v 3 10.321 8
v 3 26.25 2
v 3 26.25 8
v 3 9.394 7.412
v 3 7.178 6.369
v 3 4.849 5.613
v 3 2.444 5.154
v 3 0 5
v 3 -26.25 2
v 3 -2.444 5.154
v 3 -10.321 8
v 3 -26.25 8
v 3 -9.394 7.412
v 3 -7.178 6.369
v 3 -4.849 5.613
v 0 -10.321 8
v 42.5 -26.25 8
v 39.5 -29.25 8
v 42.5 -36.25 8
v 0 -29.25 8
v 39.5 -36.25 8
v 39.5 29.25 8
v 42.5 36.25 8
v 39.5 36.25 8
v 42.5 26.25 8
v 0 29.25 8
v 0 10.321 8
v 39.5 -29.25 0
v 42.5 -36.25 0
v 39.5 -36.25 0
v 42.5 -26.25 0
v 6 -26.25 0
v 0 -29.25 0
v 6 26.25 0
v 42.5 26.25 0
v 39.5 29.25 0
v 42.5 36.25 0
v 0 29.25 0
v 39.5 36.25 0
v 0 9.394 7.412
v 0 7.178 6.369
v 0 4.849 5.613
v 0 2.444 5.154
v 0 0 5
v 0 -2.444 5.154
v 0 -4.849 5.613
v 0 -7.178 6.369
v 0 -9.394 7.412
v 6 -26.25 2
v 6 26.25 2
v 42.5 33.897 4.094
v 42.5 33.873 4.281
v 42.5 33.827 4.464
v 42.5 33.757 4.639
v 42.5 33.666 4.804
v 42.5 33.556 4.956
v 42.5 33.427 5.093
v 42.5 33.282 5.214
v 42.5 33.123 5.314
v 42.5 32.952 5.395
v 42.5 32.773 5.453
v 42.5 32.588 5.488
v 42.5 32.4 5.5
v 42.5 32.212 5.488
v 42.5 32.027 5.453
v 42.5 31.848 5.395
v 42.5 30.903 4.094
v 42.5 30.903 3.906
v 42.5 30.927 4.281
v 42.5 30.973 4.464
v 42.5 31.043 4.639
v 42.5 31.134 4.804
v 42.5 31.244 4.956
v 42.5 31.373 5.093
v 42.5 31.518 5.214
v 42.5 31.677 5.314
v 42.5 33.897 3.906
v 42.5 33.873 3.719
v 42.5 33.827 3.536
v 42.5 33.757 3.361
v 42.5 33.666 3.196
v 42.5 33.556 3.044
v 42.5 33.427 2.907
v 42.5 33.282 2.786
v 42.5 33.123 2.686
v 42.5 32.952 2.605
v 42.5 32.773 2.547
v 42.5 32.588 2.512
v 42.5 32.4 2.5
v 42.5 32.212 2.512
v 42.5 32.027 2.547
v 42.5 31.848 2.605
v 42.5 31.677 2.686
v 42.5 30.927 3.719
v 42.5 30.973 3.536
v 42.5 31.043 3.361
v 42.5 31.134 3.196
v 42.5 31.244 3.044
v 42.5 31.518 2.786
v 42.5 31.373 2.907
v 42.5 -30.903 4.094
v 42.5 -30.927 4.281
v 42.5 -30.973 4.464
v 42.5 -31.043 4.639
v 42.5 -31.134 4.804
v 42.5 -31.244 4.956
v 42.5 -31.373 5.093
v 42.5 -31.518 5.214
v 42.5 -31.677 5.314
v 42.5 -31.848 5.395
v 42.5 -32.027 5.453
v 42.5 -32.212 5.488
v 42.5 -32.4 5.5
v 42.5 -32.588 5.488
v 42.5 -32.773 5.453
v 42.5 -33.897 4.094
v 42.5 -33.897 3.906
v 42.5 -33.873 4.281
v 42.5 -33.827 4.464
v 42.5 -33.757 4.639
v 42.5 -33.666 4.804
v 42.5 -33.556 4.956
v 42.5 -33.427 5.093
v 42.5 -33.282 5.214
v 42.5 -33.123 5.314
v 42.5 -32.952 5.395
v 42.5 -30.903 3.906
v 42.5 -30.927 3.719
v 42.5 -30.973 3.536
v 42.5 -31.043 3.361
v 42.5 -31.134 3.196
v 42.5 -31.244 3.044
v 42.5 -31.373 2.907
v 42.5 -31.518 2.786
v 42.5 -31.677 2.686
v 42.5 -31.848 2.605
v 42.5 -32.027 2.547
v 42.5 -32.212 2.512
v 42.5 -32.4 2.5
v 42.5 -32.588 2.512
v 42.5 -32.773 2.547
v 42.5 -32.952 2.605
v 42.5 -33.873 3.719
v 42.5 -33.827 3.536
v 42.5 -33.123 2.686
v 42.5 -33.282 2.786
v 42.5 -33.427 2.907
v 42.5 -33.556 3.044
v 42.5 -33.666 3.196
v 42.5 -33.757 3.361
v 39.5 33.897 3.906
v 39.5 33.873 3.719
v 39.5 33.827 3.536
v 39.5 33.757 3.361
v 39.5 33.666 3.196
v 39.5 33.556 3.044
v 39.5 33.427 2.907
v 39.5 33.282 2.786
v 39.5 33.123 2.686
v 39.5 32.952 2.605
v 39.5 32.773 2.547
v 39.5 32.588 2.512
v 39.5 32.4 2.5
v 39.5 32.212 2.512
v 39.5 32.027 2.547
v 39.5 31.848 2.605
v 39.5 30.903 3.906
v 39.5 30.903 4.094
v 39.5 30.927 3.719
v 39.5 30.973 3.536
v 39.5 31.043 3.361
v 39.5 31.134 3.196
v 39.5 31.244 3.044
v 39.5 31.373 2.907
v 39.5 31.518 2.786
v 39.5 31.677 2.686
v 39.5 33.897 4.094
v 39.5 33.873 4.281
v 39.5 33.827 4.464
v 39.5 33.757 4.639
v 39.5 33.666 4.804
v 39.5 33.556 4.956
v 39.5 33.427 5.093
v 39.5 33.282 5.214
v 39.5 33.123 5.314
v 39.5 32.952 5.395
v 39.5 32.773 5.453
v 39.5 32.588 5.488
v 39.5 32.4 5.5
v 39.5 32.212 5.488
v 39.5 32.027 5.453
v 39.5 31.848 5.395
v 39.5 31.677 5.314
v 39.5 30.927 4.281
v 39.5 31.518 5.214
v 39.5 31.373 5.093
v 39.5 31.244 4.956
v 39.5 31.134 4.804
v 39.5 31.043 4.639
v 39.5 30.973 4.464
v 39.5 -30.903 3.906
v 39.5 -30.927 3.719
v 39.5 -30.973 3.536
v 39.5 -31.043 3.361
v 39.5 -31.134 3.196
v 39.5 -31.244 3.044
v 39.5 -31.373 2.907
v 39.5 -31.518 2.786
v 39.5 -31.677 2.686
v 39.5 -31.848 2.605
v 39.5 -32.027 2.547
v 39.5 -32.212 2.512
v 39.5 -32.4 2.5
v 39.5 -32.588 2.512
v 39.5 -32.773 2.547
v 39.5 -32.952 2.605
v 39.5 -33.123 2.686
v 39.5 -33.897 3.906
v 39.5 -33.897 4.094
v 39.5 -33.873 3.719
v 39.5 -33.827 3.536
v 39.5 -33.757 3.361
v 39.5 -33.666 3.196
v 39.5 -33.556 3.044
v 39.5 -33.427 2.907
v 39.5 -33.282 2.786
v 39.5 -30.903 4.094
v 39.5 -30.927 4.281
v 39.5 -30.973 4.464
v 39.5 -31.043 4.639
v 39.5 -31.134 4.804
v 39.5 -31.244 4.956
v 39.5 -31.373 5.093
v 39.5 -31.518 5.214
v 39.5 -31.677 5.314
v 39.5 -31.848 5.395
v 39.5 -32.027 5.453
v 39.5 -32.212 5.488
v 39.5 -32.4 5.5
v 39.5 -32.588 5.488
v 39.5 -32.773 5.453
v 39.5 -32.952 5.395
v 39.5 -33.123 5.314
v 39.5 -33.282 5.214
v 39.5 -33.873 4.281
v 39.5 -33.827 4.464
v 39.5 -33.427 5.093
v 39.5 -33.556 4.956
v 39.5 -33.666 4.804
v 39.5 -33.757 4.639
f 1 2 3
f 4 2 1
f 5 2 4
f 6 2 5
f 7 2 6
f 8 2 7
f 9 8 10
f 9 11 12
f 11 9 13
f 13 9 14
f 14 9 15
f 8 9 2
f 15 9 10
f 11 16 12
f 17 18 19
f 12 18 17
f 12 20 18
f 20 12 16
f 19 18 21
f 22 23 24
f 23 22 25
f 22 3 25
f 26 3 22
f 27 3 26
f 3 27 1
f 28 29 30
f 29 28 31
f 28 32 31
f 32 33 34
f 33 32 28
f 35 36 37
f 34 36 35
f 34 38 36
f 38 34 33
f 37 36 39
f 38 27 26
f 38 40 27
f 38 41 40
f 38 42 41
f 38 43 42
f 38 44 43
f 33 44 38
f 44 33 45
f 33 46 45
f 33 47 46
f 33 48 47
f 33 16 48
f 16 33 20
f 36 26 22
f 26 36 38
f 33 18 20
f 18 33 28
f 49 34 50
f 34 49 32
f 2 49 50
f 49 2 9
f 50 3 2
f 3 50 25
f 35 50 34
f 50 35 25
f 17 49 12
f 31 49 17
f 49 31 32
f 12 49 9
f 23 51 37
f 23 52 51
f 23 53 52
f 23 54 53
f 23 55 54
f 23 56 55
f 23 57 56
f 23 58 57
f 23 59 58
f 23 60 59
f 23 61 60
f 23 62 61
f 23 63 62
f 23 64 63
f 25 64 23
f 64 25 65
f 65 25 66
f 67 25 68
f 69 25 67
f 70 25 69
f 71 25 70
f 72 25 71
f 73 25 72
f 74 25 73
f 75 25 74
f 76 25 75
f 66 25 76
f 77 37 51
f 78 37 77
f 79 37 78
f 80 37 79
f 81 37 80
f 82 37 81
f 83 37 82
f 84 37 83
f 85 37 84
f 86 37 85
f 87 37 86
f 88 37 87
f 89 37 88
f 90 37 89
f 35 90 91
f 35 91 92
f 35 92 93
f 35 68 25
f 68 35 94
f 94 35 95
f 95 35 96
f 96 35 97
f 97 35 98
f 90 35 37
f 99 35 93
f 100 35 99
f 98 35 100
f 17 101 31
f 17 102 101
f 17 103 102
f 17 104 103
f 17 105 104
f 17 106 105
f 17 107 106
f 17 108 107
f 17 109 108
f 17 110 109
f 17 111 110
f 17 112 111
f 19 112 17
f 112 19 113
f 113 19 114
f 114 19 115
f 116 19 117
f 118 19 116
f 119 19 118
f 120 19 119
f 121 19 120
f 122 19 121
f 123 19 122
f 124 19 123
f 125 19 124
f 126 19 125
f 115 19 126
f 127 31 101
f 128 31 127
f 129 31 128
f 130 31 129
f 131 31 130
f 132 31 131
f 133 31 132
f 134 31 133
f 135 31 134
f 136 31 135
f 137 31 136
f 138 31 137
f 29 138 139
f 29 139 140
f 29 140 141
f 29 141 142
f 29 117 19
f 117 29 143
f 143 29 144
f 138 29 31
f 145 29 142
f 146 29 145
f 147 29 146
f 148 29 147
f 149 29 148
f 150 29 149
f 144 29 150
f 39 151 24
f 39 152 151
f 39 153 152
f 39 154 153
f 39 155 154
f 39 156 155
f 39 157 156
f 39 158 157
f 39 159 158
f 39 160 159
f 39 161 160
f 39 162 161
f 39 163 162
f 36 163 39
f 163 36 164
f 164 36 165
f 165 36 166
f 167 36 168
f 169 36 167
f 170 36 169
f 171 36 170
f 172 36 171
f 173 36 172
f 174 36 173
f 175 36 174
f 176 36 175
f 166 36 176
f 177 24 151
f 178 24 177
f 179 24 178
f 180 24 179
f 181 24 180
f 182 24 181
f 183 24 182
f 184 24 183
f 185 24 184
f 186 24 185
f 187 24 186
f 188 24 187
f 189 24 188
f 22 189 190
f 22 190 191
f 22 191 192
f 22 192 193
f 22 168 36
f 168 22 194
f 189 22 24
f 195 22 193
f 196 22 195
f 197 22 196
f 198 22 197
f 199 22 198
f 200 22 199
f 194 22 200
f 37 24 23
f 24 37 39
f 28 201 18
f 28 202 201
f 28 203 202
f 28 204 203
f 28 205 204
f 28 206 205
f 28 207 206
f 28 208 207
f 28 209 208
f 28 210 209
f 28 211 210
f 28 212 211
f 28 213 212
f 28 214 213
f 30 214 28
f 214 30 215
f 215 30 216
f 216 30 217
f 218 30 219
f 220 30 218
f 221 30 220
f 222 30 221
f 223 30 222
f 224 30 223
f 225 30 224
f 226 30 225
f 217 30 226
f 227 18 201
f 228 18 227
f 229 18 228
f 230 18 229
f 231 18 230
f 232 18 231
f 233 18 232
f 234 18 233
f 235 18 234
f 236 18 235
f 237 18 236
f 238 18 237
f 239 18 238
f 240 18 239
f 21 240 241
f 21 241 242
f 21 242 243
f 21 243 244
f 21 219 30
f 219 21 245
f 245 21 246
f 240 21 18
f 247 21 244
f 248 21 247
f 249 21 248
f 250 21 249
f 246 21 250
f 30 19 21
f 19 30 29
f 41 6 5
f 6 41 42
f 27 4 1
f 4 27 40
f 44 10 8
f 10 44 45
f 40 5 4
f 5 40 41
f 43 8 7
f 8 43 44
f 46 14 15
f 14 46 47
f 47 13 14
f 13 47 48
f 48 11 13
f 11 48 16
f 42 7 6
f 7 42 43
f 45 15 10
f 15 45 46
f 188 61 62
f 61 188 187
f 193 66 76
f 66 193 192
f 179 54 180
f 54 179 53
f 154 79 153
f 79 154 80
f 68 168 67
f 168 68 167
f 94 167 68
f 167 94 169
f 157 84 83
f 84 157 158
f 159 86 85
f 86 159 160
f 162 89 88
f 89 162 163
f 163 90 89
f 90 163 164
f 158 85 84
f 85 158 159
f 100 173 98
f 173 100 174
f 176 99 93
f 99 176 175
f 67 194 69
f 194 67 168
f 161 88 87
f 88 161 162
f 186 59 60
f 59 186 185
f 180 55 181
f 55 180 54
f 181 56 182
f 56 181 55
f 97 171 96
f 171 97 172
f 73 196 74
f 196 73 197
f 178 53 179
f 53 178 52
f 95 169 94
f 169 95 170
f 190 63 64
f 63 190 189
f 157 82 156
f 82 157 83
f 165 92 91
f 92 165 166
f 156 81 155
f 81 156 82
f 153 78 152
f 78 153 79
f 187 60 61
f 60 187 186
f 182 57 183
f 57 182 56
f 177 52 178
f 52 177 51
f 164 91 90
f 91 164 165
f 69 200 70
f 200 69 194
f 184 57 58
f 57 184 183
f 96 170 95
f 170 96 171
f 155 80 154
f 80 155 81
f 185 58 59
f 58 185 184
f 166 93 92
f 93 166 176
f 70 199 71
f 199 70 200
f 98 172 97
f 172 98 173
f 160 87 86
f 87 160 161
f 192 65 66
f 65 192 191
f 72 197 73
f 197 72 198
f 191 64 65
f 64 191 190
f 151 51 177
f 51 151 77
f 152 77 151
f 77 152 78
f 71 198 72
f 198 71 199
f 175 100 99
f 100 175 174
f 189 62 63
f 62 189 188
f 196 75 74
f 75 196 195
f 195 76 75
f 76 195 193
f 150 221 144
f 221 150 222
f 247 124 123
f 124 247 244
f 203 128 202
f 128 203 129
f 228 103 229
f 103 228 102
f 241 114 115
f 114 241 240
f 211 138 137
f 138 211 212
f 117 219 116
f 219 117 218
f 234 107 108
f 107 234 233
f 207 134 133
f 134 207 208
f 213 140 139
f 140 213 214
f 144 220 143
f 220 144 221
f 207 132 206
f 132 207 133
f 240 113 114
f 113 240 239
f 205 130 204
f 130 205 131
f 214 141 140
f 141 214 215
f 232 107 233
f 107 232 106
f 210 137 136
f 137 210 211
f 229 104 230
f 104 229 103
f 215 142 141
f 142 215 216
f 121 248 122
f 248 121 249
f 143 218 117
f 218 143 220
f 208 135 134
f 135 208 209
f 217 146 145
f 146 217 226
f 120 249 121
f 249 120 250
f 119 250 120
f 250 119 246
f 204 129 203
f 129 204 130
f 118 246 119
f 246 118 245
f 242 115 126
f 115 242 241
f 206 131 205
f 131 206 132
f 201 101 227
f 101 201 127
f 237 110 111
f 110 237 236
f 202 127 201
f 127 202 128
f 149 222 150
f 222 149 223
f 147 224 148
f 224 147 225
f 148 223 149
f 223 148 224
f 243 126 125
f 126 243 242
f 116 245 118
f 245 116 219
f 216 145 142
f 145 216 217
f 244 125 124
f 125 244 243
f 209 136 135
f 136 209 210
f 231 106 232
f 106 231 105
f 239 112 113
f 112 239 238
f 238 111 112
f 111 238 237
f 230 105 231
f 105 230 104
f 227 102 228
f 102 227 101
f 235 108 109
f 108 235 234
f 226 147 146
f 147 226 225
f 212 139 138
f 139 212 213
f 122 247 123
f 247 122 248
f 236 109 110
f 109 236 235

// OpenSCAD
// Attache pour multiprise côté carré
d = 52.5;
tot_h = 39.5;
thick = 3;
height = 8;
base = 10;
plug_diam = 39;
difference() {
	union() {
		// Top
		translate([0, -d/2-thick, 0]) cube([thick, d+2*thick, height], center=false);
		translate([thick, -d/2, 0]) cube([3, d, 2], center=false);

		// Sides
		translate([0, d/2, 0]) cube([tot_h+thick, thick, height], center=false);
		mirror([0,1,0]) translate([0, d/2, 0]) cube([tot_h+thick, thick, height], center=false);

		// Base for screws
		translate([tot_h, d/2, 0]) cube([thick, base, height]);
		mirror([0,1,0]) translate([tot_h, d/2, 0]) cube([thick, base, height]);
	};

	// Round plug shape
	translate([-1,0,plug_diam/2+height-3])
		rotate([0, 90, 0]) cylinder(h=thick+1,r=plug_diam/2,$fn=50);

	// Screw holes
	translate([tot_h-0.5, d/2+thick+0.45*(base-thick), 0.5*height])
		rotate([0, 90, 0])
		cylinder(h=thick+1,r=1.5,$fn=50);
	mirror([0,1,0]) translate([tot_h-0.5, d/2+thick+0.45*(base-thick), 0.5*height])
		rotate([0, 90, 0])
		cylinder(h=thick+1,r=1.5,$fn=50);
};
